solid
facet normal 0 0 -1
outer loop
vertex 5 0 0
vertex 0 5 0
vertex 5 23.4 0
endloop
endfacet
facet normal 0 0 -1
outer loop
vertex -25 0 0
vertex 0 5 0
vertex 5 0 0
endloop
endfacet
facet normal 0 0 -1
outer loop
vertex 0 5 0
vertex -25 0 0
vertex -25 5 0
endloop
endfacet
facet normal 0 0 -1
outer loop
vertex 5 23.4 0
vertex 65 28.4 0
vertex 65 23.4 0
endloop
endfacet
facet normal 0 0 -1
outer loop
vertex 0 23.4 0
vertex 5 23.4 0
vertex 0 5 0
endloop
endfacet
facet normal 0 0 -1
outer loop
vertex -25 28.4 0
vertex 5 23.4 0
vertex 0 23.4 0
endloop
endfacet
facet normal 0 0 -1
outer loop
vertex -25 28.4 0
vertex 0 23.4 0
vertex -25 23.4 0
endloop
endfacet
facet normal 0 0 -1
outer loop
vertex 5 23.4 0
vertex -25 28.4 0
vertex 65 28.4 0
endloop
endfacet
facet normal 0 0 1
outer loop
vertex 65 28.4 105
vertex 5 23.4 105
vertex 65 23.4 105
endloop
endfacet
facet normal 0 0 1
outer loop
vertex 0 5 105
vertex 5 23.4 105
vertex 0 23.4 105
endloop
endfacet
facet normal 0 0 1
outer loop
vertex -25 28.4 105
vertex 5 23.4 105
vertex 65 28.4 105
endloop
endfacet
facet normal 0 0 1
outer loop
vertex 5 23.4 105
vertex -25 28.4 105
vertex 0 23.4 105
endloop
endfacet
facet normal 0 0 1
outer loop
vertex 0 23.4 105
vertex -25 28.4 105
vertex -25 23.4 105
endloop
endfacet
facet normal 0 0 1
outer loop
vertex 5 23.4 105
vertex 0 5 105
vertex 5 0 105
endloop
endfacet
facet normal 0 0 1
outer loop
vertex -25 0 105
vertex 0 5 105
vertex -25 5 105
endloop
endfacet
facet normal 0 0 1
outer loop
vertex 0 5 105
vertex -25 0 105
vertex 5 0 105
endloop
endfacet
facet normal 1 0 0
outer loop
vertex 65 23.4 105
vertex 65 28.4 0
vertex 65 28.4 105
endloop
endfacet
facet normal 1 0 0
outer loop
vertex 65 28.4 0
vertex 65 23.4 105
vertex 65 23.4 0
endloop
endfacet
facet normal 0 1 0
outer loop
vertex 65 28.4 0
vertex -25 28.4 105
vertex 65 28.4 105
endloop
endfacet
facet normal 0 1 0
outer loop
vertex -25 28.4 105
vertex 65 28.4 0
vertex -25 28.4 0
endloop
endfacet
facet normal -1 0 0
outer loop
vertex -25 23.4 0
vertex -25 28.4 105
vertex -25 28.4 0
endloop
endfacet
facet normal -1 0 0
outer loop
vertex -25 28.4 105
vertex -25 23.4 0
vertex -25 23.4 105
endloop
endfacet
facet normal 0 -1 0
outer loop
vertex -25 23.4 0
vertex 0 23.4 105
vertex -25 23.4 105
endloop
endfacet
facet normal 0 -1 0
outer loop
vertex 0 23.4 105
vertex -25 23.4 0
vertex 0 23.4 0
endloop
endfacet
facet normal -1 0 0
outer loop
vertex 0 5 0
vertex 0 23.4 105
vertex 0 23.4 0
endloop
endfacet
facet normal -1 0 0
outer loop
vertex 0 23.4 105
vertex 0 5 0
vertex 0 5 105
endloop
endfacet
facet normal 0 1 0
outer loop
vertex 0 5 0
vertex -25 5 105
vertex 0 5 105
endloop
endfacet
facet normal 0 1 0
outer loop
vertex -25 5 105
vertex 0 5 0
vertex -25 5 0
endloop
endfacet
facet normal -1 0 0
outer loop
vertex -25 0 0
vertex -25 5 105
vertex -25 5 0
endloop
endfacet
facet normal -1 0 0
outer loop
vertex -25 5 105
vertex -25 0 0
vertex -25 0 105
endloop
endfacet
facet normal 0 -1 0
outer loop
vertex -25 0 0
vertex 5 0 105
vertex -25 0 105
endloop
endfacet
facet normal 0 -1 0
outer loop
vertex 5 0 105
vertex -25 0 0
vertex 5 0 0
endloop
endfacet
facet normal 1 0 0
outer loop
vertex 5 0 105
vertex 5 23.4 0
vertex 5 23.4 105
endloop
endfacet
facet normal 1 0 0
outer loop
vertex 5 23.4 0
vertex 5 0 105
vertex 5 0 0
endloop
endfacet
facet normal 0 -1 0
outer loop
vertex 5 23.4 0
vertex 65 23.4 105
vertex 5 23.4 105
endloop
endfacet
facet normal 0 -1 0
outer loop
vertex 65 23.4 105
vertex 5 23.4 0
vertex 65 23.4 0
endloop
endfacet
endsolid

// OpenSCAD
// Pipette Holder Clamp
// Designed for an 18mm shelf.
// Printed lying on its side (XY plane is the profile, Z is the extrusion/length).

// --- Dimensions ---
shelf_thickness = 18.0;
spine_x_end     = 5.0;
spine_y_end     = 28.4;

bottom_jaw_x_start = -25.0;
bottom_jaw_x_end   = 5.0;
bottom_jaw_y_end    = 5.0;

top_jaw_x_start    = -25.0;
top_jaw_x_end      = 65.0;
top_jaw_y_start     = 23.4;
top_jaw_y_end       = 28.4;

extrusion_length    = 105.0;
hole_diameter       = 20.0;
hole_x_pos          = 42.0;
hole_z_pos_1        = 17.5;
hole_z_pos_2        = 52.5;
hole_z_pos_3        = 87.5;

$fn = 64;

// --- Geometry Construction ---

// The profile is defined in the XY plane.
// The part is extruded along Z.
// Note: The user requested the part be printed lying on its side.
// In OpenSCAD, we define the 2D profile and extrude it along Z.

module profile() {
    difference() {
        // Main C-shape body
        union() {
            // Spine (back vertical part)
            translate([0, 0]) square([spine_x_end, spine_y_end]);
            
            // Bottom Jaw
            translate([bottom_jaw_x_start, 0]) square([bottom_jaw_x_end - bottom_jaw_x_start, bottom_jaw_y_end]);
            
            // Top Jaw and Arm
            translate([top_jaw_x_start, top_jaw_y_start]) square([top_jaw_x_end - top_jaw_x_start, top_jaw_y_end - top_jaw_y_start]);
        }
        
        // The gap for the shelf (18mm) is implicitly created by the space between 
        // the bottom jaw (y=5) and top jaw (y=23.4). 
        // 23.4 - 5 = 18.4mm gap, which accommodates the 18mm shelf.
    }
}

// The user specifies the holes go through the arm along Y (vertically in use).
// Since the part is printed on its side (Z is extrusion), "vertically in use" 
// means the holes are drilled through the thickness of the arm (the Y direction).
// However, in the print orientation (XY profile, Z extrusion), 
// the "arm" is the part extending along the X axis.
// The user says: "Three round 20 mm holes go through the arm along Y (vertically in use)".
// In the print orientation (XY plane is profile), Y is the "vertical" direction of the profile.
// Therefore, the holes are cylinders oriented along the Y axis.

difference() {
    // The main extruded body
    linear_extrude(height = extrusion_length) {
        profile();
    }

    // The three pipette holes
    // They are centered at x = 42 and specific Z positions.
    // They go "through the arm along Y".
    // To cut through the Y direction, we rotate the cylinder.
    for (z_pos = [hole_z_pos_1, hole_z_pos_2, hole_z_pos_3]) {
        translate([hole_x_pos, 0, z_pos])
        rotate([0, 90, 0]) // Rotate to align cylinder with Y axis
        cylinder(h = 100, d = hole_diameter); // h is large to ensure complete cut
    }
}
